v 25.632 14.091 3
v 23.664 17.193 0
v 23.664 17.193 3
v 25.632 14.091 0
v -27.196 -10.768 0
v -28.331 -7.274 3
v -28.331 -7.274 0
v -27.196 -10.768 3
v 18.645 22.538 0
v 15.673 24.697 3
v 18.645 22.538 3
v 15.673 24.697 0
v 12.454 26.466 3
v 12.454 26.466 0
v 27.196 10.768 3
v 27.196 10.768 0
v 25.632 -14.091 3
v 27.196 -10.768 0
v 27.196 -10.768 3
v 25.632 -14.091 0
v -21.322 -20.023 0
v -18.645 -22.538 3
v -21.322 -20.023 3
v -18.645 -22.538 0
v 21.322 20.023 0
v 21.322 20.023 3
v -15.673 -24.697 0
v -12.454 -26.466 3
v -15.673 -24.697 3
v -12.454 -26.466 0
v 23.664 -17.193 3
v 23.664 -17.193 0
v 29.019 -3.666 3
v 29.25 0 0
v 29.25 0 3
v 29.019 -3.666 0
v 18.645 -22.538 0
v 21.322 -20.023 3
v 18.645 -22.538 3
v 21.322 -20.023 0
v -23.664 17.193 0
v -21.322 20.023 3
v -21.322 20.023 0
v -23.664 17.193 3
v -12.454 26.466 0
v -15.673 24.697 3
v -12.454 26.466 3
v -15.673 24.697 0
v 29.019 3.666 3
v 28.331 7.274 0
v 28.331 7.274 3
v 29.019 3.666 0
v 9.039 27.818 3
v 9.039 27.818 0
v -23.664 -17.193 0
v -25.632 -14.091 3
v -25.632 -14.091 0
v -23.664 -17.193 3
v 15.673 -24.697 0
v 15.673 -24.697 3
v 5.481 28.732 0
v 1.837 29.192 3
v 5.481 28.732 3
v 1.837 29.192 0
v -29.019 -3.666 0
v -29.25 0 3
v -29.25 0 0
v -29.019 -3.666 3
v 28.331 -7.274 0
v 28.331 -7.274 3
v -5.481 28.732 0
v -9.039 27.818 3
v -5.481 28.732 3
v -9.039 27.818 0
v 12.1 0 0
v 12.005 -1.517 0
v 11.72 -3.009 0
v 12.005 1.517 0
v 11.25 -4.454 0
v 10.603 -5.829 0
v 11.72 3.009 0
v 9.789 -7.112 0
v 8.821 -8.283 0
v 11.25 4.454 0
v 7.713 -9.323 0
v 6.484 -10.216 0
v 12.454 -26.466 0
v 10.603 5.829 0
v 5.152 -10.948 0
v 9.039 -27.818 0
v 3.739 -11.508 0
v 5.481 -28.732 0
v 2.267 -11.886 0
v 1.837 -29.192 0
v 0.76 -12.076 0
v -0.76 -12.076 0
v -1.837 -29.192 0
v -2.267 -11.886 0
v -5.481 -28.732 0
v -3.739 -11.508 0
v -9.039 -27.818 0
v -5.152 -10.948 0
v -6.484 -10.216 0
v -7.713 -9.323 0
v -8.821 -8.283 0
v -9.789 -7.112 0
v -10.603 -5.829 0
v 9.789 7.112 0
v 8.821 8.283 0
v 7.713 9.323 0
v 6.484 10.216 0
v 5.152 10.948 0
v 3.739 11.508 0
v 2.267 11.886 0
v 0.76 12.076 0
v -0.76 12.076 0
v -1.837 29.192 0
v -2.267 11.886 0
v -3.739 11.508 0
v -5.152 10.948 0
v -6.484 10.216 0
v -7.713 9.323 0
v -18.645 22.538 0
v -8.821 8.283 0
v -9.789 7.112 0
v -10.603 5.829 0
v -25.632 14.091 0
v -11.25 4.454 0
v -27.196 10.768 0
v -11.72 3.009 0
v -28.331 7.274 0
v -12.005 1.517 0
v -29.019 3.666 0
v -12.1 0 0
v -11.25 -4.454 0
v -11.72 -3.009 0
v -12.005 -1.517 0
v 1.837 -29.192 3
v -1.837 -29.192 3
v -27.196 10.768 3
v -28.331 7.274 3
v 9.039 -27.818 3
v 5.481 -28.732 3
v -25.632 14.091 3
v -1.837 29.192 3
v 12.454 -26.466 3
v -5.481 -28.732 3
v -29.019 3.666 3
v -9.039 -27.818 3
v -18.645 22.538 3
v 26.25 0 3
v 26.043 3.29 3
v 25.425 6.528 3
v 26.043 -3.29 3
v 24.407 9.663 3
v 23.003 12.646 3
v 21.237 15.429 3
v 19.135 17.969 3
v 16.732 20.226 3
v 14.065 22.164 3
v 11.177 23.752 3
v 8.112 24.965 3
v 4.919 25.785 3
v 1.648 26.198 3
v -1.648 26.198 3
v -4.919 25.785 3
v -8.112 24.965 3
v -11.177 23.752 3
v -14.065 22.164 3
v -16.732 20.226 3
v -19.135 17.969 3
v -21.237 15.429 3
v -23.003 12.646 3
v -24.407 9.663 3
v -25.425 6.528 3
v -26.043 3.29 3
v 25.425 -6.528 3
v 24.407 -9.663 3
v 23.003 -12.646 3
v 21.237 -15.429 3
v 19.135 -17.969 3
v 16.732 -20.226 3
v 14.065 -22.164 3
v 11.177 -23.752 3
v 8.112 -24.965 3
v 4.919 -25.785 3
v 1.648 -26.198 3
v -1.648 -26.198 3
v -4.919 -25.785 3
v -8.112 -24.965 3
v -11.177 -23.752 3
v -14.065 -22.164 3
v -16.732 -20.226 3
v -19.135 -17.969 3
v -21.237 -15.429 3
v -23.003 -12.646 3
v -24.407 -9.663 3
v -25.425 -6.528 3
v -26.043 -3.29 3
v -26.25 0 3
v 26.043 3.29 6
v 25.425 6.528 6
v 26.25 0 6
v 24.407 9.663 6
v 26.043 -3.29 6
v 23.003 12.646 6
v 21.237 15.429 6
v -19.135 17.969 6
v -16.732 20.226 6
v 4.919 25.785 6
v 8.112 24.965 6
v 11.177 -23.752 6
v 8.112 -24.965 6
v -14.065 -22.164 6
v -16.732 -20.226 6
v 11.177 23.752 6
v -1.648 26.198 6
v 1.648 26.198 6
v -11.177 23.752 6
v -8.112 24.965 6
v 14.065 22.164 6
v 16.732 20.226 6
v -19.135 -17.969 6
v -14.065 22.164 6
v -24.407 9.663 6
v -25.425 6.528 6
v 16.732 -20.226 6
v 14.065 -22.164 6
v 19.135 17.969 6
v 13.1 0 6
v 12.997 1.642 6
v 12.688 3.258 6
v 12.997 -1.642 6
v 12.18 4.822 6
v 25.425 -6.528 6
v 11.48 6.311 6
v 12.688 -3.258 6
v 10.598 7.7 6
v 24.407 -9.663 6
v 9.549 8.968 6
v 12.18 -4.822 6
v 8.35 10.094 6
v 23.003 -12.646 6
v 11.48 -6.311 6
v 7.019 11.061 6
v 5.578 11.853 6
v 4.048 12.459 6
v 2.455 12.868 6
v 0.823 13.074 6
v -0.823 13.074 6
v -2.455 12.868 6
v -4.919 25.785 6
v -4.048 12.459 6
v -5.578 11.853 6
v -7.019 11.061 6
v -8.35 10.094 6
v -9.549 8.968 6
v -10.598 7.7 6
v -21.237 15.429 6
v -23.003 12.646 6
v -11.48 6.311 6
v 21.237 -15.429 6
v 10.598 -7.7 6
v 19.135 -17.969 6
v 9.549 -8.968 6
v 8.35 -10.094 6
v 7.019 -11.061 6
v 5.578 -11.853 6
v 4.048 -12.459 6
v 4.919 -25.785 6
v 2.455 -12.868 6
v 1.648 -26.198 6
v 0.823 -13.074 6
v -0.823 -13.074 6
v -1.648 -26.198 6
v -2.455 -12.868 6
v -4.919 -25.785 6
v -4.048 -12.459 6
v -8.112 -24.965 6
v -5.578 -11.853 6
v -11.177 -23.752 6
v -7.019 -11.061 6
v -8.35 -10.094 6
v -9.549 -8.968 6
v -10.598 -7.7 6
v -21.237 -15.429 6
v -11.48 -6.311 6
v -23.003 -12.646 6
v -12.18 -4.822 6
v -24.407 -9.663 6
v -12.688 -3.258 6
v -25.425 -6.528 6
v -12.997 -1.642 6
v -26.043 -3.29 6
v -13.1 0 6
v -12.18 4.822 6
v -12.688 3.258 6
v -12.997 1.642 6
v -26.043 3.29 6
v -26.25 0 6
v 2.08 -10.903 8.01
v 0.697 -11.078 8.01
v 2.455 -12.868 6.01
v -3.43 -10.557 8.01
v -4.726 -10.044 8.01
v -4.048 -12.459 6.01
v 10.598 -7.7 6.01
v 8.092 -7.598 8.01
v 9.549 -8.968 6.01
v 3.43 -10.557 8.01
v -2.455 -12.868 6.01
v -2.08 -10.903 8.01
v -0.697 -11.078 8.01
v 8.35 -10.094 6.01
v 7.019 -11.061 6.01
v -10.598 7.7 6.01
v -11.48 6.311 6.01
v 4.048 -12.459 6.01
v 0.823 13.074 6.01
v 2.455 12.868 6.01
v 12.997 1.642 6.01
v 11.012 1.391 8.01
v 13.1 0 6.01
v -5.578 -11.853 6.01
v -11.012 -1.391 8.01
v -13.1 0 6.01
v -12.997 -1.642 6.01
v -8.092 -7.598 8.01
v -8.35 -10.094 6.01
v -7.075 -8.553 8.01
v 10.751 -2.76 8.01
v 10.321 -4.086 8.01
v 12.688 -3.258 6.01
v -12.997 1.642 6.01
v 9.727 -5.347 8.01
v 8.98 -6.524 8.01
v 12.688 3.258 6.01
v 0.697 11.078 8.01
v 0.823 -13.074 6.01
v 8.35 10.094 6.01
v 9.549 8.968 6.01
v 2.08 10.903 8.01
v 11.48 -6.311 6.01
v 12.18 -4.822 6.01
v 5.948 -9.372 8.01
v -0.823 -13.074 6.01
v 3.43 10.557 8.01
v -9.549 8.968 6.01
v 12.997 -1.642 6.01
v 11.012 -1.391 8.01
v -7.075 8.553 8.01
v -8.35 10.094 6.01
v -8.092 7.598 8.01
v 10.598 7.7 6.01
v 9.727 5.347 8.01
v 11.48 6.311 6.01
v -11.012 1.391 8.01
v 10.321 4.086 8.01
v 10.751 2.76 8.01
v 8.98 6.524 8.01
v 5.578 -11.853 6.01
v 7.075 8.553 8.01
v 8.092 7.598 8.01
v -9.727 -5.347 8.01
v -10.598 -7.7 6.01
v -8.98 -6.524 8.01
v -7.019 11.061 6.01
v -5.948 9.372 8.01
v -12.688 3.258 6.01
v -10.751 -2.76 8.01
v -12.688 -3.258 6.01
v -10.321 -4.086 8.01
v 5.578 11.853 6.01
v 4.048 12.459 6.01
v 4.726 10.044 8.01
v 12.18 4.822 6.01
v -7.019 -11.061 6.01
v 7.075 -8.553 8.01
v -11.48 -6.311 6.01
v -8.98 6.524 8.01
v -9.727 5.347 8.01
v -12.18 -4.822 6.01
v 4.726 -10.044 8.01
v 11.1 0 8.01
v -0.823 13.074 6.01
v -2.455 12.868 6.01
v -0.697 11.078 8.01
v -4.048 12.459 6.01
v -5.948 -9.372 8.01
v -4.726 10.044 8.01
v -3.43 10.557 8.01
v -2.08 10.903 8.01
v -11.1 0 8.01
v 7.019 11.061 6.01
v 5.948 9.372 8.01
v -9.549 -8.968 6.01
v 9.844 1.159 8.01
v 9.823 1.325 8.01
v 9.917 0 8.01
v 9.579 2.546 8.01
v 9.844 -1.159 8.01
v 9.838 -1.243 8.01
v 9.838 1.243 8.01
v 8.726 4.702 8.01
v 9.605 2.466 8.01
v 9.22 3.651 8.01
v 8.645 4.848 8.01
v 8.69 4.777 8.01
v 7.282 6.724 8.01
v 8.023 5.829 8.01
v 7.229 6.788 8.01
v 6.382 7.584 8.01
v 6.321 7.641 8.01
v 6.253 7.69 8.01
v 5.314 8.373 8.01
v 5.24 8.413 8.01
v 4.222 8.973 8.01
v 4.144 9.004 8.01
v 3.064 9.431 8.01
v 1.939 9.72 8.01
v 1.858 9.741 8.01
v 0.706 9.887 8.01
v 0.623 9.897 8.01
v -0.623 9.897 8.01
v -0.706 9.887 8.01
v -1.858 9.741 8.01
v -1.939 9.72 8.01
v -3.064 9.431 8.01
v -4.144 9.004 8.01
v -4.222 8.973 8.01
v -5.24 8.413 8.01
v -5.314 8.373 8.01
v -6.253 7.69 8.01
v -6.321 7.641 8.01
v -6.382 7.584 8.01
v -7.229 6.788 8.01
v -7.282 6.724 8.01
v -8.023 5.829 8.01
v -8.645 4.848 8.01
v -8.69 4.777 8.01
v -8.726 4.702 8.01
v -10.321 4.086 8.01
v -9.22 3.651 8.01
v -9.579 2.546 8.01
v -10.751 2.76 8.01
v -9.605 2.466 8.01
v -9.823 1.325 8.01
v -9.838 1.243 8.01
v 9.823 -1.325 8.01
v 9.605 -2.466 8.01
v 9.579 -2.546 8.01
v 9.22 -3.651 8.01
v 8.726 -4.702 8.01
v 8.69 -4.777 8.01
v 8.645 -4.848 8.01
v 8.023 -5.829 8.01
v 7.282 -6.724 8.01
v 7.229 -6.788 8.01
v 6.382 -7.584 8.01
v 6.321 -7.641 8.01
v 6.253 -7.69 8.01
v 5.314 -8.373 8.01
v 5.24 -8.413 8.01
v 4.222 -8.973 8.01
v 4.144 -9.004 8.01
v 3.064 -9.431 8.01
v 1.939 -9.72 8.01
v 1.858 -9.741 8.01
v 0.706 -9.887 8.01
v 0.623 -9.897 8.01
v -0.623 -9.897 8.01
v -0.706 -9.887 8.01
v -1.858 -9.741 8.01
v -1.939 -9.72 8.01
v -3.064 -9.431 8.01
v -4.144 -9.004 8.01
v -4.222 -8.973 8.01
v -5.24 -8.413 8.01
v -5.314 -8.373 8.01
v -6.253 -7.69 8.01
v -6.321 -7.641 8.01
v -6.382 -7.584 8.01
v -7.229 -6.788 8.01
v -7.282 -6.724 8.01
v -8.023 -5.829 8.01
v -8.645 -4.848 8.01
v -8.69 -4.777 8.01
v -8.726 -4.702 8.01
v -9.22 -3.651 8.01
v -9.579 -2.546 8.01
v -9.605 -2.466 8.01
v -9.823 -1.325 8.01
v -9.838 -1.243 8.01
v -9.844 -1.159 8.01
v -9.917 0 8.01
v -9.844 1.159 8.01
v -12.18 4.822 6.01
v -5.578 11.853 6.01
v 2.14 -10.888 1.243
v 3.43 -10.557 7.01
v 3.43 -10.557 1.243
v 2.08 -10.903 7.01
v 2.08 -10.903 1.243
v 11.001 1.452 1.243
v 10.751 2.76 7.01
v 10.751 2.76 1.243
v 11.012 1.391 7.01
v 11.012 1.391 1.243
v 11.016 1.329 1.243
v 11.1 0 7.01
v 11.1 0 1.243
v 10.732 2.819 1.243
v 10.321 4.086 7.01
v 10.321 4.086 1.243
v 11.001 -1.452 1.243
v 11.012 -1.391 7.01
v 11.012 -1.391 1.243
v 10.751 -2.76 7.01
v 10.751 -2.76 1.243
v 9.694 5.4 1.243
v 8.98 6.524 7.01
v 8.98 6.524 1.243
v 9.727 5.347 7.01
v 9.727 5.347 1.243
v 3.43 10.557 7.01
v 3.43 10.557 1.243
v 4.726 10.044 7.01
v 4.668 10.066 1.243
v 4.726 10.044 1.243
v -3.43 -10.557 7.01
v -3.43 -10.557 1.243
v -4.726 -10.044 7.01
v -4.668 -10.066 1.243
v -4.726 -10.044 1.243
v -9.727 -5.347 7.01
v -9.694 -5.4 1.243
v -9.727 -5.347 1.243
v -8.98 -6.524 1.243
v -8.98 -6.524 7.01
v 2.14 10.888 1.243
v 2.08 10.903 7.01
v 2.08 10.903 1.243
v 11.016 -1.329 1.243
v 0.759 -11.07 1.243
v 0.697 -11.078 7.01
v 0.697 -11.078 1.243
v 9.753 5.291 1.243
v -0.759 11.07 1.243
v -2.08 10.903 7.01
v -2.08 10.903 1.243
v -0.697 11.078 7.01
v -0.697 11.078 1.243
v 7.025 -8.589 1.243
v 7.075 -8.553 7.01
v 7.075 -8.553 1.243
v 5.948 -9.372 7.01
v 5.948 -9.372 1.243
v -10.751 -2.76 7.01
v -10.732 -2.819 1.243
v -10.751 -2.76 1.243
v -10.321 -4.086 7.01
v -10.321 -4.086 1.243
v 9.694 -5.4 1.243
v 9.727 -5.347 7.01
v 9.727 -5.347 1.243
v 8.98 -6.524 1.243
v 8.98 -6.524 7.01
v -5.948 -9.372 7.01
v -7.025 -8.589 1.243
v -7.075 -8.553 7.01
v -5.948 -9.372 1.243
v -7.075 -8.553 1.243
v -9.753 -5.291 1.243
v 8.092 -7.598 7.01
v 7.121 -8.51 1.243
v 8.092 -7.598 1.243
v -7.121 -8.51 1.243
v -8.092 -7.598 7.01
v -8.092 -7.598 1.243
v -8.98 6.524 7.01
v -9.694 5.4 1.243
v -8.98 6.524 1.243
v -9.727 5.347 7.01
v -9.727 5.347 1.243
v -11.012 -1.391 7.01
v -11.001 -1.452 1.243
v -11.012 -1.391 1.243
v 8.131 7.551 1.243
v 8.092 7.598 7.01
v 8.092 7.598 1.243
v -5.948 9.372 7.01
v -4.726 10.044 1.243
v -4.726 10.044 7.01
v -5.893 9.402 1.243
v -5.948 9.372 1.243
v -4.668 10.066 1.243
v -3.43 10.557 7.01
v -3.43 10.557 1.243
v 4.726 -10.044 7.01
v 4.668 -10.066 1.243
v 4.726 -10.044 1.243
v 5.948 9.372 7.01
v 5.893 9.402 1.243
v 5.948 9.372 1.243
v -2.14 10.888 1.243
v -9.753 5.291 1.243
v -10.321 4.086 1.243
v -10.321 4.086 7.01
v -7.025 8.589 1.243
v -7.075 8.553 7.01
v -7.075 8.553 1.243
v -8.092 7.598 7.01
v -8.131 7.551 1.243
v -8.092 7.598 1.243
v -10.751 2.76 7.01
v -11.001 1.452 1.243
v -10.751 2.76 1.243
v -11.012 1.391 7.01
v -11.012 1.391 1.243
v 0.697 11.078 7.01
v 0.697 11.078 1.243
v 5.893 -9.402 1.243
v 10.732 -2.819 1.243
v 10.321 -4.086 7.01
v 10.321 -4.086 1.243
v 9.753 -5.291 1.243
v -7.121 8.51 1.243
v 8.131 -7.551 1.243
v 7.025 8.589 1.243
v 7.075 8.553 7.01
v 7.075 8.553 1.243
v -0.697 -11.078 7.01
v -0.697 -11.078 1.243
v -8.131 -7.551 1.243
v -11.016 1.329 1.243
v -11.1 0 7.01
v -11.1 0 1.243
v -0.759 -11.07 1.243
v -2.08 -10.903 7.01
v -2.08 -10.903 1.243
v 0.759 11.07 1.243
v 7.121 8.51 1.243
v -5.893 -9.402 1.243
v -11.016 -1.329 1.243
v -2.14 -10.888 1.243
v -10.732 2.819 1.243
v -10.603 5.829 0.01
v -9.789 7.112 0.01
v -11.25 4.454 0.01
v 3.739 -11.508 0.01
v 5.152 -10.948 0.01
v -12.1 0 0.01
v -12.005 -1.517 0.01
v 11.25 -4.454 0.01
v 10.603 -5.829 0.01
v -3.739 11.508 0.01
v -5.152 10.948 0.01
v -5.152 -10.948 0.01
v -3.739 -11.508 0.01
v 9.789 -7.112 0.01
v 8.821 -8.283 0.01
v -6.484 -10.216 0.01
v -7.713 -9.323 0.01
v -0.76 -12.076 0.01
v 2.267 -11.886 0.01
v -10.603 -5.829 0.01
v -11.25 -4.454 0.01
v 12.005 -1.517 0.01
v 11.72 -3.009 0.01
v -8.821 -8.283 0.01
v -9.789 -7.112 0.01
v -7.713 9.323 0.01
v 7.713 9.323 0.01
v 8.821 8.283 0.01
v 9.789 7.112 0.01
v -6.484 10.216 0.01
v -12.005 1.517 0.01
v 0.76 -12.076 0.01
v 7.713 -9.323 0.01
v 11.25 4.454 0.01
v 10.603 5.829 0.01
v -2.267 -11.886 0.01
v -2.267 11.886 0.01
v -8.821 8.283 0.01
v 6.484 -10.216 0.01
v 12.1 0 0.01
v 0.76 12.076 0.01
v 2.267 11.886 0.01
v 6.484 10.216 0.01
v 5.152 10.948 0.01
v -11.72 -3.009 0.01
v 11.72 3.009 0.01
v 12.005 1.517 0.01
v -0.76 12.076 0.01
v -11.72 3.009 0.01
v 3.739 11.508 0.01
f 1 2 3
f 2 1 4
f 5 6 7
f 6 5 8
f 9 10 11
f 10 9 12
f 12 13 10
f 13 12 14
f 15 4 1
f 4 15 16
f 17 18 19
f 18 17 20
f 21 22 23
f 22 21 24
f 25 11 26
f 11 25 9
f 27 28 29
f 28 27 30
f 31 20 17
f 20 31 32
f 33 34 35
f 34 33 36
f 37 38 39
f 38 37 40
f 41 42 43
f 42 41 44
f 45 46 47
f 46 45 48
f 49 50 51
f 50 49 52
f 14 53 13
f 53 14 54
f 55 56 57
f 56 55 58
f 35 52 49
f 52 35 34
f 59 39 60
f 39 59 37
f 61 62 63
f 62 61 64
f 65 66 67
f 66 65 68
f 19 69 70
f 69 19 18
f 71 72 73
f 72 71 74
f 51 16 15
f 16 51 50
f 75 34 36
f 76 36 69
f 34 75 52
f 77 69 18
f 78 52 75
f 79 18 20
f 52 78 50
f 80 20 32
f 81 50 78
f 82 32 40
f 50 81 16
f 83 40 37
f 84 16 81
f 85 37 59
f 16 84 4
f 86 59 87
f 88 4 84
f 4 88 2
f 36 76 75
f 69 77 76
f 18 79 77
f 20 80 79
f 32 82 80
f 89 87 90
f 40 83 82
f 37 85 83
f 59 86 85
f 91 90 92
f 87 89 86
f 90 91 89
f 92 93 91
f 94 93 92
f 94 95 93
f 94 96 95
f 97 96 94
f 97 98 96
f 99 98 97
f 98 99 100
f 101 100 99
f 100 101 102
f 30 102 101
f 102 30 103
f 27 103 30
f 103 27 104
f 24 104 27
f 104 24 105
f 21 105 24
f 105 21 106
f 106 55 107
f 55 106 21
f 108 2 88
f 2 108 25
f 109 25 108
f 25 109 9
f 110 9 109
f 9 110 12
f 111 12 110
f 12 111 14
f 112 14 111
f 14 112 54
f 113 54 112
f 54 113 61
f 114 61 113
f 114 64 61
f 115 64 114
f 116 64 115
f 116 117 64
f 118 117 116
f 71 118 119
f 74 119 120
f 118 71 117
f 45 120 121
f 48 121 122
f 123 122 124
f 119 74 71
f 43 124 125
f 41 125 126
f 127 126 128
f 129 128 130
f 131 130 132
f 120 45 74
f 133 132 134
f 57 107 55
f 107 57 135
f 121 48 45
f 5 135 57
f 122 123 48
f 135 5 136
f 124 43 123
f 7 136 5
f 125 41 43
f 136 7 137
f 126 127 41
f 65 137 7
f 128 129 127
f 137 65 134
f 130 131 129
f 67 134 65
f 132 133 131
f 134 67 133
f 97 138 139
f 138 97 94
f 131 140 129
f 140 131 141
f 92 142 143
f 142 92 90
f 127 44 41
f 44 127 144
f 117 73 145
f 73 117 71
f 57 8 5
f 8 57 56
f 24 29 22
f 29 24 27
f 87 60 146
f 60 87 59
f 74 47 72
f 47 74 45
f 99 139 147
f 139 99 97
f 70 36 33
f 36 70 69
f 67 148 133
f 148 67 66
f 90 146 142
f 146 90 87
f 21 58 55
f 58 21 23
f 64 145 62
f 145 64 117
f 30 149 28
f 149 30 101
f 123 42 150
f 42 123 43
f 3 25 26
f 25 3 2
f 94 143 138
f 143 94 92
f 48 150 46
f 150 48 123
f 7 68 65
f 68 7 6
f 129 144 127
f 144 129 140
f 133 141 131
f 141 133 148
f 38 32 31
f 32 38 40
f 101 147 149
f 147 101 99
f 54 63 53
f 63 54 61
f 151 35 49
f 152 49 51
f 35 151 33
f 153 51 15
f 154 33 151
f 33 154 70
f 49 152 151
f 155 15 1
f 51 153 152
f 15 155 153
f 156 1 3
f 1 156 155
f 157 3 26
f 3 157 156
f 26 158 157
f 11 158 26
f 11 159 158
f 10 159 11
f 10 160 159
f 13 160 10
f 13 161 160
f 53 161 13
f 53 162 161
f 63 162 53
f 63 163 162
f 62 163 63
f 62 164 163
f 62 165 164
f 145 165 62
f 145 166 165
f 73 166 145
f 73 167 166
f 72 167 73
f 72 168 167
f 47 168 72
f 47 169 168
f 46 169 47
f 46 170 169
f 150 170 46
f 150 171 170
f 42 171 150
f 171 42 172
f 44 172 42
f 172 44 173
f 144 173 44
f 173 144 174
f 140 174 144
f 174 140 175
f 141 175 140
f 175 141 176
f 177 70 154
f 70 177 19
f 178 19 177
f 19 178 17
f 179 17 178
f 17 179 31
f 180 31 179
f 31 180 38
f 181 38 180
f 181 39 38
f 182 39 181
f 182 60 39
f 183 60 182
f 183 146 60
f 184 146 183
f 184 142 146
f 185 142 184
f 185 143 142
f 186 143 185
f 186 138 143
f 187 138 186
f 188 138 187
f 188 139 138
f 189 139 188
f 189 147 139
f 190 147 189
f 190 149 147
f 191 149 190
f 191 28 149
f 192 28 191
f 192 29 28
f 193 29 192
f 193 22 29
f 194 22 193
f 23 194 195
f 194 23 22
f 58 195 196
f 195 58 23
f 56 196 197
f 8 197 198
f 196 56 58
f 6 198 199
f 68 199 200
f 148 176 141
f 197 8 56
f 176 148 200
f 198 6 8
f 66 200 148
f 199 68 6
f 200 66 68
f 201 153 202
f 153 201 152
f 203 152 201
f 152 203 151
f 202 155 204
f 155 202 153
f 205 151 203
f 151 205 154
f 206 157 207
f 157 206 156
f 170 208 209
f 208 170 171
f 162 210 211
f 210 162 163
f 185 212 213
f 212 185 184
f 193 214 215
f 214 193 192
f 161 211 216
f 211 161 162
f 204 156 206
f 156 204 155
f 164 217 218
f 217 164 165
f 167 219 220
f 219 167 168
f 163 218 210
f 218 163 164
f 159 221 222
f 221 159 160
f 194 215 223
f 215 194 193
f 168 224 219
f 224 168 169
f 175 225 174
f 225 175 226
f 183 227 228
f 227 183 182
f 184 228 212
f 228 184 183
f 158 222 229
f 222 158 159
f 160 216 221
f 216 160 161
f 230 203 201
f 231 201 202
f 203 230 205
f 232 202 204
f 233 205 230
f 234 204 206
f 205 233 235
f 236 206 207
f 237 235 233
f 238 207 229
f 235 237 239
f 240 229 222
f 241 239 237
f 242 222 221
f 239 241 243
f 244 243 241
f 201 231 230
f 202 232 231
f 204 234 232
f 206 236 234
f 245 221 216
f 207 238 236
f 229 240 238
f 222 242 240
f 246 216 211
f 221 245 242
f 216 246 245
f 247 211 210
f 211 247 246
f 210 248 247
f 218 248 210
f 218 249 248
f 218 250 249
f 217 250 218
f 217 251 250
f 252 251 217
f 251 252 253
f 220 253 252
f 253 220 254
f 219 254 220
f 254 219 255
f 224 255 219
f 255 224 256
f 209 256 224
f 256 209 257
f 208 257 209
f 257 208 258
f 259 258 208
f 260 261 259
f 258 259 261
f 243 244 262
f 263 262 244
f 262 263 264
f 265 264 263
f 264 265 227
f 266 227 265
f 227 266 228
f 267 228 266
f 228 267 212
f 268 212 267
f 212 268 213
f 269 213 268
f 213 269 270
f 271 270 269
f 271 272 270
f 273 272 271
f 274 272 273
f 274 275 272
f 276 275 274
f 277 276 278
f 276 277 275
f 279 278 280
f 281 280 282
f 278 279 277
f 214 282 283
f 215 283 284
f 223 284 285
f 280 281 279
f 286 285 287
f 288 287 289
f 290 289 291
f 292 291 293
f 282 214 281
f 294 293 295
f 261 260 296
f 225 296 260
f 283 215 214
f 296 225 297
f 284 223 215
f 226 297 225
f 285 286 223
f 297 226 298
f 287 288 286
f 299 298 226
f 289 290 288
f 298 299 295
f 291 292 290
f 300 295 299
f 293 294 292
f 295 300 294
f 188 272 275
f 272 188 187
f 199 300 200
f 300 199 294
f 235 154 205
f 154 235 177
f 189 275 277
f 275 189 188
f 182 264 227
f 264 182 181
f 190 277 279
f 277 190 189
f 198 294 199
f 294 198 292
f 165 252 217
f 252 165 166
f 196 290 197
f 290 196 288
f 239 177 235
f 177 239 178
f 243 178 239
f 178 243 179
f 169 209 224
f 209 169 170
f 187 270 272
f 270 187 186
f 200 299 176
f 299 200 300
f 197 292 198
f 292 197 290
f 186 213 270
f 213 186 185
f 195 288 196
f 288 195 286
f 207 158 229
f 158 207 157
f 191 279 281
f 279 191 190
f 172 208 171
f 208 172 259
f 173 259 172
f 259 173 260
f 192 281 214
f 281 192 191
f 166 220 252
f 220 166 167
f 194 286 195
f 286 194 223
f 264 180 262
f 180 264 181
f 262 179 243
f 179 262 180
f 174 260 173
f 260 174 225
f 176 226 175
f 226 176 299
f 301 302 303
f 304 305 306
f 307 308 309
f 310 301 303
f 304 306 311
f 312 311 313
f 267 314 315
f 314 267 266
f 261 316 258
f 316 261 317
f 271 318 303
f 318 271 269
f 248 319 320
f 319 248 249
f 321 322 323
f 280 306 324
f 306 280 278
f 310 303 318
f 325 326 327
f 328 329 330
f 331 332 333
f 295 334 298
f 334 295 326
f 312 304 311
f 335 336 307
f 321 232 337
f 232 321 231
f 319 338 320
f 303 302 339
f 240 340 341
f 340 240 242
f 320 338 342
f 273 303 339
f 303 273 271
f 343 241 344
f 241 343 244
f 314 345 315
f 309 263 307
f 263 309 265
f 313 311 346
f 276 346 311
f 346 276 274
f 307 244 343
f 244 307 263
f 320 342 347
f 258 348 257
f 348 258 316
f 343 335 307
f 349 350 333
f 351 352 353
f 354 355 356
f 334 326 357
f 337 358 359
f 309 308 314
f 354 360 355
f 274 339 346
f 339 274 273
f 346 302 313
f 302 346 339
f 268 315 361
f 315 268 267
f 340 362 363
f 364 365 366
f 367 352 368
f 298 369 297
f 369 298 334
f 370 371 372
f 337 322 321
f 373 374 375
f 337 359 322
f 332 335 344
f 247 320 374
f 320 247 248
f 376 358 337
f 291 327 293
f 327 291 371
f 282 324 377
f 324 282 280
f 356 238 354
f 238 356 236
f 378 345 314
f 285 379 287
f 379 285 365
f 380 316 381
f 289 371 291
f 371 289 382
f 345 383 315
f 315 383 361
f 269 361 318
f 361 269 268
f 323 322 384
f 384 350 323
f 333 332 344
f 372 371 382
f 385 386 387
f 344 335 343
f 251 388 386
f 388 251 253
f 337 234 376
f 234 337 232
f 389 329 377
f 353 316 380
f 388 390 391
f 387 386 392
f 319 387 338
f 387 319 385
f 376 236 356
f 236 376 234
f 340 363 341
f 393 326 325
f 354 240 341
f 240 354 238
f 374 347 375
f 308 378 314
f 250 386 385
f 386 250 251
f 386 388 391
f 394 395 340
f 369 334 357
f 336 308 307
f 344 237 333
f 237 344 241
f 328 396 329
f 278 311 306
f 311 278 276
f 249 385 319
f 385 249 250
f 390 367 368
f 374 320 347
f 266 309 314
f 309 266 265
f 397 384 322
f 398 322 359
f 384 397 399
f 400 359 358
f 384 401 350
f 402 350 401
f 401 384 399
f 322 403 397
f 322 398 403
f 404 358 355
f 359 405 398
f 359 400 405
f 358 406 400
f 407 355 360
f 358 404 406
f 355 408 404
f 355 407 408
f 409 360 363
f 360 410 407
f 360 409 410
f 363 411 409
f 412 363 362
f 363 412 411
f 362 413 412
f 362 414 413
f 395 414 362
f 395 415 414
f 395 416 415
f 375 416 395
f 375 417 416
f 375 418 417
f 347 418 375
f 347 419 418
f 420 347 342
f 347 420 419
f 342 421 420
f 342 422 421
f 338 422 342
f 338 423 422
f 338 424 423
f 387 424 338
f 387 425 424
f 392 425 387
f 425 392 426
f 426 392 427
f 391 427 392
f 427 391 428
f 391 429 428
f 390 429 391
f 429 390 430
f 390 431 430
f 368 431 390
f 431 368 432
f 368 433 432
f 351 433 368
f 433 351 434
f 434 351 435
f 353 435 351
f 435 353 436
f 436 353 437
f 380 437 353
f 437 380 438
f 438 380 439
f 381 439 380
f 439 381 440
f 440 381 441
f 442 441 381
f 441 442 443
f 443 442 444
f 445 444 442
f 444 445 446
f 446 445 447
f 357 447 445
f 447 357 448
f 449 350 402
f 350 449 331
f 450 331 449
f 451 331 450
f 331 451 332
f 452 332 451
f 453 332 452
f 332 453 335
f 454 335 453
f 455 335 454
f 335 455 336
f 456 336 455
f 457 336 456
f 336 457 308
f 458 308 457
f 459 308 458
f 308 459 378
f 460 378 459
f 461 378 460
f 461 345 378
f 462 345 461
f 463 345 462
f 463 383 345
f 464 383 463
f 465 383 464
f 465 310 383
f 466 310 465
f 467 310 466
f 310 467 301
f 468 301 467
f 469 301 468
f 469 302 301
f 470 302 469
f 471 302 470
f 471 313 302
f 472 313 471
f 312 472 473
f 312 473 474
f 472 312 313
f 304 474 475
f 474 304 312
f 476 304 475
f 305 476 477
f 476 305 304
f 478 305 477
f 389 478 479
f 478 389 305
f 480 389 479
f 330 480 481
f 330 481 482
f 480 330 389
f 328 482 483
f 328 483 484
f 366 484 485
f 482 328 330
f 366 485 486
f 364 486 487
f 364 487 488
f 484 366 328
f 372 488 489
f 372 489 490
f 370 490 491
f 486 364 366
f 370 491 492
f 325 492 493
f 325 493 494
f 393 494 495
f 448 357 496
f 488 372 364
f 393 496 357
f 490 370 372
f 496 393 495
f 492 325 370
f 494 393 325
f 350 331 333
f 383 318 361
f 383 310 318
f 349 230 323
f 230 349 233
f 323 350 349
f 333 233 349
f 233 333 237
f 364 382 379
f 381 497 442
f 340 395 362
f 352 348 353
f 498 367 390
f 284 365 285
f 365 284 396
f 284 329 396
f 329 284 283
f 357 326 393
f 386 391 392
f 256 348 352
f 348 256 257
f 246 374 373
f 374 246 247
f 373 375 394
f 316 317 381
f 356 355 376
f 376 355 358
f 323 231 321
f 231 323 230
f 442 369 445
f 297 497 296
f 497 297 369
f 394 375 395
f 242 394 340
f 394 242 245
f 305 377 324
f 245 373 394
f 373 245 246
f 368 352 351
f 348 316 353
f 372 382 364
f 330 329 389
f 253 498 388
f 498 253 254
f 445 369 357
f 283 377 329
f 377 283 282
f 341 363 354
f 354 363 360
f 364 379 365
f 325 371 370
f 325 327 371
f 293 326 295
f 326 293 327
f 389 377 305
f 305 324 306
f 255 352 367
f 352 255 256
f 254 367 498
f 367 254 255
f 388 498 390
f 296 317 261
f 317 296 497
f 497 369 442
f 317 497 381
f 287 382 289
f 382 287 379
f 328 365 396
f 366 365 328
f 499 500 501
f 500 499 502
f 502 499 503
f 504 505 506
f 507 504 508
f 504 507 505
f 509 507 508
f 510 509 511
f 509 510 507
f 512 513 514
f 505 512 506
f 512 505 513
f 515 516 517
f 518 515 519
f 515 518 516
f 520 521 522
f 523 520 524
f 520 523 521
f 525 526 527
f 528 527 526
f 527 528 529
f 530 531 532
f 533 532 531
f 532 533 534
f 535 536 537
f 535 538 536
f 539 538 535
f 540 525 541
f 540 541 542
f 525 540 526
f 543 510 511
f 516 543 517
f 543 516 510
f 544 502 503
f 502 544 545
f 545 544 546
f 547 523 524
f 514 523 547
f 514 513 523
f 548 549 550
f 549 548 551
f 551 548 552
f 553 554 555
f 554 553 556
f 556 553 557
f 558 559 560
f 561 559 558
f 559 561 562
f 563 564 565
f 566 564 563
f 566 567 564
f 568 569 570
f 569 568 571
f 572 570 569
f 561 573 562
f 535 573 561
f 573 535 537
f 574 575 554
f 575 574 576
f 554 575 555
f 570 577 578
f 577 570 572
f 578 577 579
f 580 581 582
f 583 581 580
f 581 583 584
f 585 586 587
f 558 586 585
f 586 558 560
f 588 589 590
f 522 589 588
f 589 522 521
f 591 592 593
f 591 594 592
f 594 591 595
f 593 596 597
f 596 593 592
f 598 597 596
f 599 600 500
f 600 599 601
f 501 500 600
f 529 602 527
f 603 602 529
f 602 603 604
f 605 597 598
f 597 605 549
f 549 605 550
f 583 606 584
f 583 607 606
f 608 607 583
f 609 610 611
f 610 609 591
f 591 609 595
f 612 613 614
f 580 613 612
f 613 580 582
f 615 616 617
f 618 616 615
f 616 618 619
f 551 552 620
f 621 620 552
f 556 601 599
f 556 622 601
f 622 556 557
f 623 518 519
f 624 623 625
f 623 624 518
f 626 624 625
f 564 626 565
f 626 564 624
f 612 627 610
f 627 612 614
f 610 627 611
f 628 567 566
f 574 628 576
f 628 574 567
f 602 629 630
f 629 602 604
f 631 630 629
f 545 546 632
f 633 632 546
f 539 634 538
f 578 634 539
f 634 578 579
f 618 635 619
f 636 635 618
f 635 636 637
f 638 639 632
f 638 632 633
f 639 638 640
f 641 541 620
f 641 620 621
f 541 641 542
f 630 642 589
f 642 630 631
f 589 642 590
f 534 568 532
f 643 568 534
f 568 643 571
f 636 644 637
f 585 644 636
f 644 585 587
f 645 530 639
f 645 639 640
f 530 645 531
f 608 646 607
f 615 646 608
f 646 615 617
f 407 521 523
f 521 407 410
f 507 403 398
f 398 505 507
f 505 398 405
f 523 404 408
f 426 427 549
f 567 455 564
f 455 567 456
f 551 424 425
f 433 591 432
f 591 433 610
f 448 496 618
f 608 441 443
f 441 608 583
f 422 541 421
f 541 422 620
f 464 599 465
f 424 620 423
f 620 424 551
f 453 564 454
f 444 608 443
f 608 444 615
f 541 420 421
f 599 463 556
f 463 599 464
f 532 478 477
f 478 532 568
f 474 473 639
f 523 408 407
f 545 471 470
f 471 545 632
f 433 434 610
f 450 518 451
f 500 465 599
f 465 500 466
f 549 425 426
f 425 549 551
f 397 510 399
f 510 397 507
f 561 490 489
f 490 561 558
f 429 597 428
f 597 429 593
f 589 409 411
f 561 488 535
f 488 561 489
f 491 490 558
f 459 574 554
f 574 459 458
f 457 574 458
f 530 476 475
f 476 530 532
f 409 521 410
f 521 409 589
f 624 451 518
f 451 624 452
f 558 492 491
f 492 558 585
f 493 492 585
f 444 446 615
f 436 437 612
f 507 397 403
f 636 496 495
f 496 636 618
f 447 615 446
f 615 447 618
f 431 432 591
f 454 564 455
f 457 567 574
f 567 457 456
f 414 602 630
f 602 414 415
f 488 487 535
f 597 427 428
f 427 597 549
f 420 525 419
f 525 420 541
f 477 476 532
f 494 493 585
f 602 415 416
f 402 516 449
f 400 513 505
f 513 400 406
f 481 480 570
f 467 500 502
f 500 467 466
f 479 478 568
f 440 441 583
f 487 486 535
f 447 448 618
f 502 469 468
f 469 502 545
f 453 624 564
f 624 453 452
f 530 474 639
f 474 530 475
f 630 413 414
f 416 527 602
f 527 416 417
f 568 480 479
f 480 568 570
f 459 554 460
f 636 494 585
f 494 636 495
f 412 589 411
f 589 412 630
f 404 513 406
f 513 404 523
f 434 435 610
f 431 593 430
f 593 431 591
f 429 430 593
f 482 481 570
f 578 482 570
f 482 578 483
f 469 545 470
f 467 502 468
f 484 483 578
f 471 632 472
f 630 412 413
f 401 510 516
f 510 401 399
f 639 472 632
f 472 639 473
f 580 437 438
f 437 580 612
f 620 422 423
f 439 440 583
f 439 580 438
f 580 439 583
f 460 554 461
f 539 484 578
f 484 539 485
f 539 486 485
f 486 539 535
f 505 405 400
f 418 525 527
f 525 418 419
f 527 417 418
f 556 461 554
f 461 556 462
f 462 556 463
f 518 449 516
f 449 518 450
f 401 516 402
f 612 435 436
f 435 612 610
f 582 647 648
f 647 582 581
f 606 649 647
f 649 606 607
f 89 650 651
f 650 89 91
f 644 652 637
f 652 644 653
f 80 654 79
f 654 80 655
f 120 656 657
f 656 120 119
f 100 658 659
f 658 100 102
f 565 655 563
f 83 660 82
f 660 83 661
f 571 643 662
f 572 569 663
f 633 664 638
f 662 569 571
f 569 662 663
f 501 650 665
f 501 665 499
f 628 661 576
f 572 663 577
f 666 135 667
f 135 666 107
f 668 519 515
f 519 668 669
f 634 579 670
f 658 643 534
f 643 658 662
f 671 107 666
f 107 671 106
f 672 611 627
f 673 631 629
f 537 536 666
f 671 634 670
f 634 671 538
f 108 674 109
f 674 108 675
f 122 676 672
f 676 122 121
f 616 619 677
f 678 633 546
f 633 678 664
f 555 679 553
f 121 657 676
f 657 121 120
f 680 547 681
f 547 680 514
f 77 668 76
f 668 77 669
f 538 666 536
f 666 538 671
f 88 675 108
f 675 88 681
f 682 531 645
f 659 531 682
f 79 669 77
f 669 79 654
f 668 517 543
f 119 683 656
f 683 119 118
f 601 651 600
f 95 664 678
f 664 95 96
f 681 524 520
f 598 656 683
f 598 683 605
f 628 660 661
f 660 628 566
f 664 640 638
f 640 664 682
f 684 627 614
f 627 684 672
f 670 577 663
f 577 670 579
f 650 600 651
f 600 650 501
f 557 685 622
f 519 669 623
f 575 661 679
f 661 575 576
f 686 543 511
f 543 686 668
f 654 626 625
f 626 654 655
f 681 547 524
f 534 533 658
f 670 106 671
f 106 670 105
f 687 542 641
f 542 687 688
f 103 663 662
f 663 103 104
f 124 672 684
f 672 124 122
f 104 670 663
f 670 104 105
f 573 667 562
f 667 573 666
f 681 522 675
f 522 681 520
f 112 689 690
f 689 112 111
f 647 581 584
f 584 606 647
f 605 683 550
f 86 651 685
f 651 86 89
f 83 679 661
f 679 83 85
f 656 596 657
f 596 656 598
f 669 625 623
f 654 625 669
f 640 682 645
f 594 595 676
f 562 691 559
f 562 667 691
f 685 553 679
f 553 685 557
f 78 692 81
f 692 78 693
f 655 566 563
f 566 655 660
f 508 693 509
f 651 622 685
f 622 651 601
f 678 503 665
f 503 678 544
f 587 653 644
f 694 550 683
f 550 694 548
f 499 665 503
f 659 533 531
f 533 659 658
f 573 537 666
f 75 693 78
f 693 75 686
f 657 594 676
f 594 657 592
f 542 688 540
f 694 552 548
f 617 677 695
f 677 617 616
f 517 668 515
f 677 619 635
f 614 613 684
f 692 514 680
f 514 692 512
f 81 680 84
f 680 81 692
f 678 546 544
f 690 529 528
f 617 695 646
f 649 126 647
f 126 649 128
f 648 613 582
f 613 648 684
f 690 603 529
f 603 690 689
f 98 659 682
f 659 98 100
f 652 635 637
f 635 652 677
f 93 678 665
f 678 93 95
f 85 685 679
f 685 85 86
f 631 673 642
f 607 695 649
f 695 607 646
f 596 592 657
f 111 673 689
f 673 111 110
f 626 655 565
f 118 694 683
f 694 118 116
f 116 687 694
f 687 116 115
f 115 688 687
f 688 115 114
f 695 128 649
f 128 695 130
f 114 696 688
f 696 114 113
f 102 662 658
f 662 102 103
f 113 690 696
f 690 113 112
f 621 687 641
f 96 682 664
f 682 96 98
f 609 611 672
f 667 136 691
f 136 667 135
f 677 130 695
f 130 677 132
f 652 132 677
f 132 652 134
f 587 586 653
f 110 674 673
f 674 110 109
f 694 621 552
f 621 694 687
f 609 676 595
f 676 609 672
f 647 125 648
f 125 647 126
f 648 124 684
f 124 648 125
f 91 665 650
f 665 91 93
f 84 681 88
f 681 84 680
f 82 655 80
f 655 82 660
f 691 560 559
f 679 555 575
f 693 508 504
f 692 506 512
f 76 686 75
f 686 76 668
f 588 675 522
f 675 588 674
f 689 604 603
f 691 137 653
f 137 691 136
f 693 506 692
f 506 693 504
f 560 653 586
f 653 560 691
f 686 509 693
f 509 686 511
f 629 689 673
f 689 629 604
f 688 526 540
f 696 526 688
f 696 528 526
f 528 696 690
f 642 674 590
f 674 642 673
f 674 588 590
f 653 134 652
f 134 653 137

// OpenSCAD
// Inner diameter of the Spool in mm
Spool_Diameter = 52.5;

// Outer diameter of the bearing in mm
Bearing_Diameter = 22.2;

/* [Hidden] */
$fn=50;
difference()
{
	union()
	{
		translate ([0,0,0])cylinder(d=Spool_Diameter+6,h=3); // Outer plate
		translate ([0,0,3])cylinder(d=Spool_Diameter,h=3); // Inner plate
		hull() 
		{
			// Bearing support
			translate ([0,0,6])cylinder(d=Bearing_Diameter+4,h=0.01);  
			translate ([0,0,8])cylinder(d=Bearing_Diameter,h=0.01); 
		}
	}
	translate ([0,0,0]) cylinder(d=Bearing_Diameter,h=7); // Bearing cut

	hull() 
	{
		// Bearing support cut
		translate ([0,0,7])cylinder(d=Bearing_Diameter,h=0.01);
		translate ([0,0,13])cylinder(d=8,h=0.01);
	}

	hull() 
	{
		// Bearing entry cut
		translate ([0,0,0])cylinder(d=Bearing_Diameter+2,h=0.01);
		translate ([0,0,8])cylinder(d=8,h=2);
	}
}

// Made by Tech2C
// https://www.youtube.com/c/Tech2C
